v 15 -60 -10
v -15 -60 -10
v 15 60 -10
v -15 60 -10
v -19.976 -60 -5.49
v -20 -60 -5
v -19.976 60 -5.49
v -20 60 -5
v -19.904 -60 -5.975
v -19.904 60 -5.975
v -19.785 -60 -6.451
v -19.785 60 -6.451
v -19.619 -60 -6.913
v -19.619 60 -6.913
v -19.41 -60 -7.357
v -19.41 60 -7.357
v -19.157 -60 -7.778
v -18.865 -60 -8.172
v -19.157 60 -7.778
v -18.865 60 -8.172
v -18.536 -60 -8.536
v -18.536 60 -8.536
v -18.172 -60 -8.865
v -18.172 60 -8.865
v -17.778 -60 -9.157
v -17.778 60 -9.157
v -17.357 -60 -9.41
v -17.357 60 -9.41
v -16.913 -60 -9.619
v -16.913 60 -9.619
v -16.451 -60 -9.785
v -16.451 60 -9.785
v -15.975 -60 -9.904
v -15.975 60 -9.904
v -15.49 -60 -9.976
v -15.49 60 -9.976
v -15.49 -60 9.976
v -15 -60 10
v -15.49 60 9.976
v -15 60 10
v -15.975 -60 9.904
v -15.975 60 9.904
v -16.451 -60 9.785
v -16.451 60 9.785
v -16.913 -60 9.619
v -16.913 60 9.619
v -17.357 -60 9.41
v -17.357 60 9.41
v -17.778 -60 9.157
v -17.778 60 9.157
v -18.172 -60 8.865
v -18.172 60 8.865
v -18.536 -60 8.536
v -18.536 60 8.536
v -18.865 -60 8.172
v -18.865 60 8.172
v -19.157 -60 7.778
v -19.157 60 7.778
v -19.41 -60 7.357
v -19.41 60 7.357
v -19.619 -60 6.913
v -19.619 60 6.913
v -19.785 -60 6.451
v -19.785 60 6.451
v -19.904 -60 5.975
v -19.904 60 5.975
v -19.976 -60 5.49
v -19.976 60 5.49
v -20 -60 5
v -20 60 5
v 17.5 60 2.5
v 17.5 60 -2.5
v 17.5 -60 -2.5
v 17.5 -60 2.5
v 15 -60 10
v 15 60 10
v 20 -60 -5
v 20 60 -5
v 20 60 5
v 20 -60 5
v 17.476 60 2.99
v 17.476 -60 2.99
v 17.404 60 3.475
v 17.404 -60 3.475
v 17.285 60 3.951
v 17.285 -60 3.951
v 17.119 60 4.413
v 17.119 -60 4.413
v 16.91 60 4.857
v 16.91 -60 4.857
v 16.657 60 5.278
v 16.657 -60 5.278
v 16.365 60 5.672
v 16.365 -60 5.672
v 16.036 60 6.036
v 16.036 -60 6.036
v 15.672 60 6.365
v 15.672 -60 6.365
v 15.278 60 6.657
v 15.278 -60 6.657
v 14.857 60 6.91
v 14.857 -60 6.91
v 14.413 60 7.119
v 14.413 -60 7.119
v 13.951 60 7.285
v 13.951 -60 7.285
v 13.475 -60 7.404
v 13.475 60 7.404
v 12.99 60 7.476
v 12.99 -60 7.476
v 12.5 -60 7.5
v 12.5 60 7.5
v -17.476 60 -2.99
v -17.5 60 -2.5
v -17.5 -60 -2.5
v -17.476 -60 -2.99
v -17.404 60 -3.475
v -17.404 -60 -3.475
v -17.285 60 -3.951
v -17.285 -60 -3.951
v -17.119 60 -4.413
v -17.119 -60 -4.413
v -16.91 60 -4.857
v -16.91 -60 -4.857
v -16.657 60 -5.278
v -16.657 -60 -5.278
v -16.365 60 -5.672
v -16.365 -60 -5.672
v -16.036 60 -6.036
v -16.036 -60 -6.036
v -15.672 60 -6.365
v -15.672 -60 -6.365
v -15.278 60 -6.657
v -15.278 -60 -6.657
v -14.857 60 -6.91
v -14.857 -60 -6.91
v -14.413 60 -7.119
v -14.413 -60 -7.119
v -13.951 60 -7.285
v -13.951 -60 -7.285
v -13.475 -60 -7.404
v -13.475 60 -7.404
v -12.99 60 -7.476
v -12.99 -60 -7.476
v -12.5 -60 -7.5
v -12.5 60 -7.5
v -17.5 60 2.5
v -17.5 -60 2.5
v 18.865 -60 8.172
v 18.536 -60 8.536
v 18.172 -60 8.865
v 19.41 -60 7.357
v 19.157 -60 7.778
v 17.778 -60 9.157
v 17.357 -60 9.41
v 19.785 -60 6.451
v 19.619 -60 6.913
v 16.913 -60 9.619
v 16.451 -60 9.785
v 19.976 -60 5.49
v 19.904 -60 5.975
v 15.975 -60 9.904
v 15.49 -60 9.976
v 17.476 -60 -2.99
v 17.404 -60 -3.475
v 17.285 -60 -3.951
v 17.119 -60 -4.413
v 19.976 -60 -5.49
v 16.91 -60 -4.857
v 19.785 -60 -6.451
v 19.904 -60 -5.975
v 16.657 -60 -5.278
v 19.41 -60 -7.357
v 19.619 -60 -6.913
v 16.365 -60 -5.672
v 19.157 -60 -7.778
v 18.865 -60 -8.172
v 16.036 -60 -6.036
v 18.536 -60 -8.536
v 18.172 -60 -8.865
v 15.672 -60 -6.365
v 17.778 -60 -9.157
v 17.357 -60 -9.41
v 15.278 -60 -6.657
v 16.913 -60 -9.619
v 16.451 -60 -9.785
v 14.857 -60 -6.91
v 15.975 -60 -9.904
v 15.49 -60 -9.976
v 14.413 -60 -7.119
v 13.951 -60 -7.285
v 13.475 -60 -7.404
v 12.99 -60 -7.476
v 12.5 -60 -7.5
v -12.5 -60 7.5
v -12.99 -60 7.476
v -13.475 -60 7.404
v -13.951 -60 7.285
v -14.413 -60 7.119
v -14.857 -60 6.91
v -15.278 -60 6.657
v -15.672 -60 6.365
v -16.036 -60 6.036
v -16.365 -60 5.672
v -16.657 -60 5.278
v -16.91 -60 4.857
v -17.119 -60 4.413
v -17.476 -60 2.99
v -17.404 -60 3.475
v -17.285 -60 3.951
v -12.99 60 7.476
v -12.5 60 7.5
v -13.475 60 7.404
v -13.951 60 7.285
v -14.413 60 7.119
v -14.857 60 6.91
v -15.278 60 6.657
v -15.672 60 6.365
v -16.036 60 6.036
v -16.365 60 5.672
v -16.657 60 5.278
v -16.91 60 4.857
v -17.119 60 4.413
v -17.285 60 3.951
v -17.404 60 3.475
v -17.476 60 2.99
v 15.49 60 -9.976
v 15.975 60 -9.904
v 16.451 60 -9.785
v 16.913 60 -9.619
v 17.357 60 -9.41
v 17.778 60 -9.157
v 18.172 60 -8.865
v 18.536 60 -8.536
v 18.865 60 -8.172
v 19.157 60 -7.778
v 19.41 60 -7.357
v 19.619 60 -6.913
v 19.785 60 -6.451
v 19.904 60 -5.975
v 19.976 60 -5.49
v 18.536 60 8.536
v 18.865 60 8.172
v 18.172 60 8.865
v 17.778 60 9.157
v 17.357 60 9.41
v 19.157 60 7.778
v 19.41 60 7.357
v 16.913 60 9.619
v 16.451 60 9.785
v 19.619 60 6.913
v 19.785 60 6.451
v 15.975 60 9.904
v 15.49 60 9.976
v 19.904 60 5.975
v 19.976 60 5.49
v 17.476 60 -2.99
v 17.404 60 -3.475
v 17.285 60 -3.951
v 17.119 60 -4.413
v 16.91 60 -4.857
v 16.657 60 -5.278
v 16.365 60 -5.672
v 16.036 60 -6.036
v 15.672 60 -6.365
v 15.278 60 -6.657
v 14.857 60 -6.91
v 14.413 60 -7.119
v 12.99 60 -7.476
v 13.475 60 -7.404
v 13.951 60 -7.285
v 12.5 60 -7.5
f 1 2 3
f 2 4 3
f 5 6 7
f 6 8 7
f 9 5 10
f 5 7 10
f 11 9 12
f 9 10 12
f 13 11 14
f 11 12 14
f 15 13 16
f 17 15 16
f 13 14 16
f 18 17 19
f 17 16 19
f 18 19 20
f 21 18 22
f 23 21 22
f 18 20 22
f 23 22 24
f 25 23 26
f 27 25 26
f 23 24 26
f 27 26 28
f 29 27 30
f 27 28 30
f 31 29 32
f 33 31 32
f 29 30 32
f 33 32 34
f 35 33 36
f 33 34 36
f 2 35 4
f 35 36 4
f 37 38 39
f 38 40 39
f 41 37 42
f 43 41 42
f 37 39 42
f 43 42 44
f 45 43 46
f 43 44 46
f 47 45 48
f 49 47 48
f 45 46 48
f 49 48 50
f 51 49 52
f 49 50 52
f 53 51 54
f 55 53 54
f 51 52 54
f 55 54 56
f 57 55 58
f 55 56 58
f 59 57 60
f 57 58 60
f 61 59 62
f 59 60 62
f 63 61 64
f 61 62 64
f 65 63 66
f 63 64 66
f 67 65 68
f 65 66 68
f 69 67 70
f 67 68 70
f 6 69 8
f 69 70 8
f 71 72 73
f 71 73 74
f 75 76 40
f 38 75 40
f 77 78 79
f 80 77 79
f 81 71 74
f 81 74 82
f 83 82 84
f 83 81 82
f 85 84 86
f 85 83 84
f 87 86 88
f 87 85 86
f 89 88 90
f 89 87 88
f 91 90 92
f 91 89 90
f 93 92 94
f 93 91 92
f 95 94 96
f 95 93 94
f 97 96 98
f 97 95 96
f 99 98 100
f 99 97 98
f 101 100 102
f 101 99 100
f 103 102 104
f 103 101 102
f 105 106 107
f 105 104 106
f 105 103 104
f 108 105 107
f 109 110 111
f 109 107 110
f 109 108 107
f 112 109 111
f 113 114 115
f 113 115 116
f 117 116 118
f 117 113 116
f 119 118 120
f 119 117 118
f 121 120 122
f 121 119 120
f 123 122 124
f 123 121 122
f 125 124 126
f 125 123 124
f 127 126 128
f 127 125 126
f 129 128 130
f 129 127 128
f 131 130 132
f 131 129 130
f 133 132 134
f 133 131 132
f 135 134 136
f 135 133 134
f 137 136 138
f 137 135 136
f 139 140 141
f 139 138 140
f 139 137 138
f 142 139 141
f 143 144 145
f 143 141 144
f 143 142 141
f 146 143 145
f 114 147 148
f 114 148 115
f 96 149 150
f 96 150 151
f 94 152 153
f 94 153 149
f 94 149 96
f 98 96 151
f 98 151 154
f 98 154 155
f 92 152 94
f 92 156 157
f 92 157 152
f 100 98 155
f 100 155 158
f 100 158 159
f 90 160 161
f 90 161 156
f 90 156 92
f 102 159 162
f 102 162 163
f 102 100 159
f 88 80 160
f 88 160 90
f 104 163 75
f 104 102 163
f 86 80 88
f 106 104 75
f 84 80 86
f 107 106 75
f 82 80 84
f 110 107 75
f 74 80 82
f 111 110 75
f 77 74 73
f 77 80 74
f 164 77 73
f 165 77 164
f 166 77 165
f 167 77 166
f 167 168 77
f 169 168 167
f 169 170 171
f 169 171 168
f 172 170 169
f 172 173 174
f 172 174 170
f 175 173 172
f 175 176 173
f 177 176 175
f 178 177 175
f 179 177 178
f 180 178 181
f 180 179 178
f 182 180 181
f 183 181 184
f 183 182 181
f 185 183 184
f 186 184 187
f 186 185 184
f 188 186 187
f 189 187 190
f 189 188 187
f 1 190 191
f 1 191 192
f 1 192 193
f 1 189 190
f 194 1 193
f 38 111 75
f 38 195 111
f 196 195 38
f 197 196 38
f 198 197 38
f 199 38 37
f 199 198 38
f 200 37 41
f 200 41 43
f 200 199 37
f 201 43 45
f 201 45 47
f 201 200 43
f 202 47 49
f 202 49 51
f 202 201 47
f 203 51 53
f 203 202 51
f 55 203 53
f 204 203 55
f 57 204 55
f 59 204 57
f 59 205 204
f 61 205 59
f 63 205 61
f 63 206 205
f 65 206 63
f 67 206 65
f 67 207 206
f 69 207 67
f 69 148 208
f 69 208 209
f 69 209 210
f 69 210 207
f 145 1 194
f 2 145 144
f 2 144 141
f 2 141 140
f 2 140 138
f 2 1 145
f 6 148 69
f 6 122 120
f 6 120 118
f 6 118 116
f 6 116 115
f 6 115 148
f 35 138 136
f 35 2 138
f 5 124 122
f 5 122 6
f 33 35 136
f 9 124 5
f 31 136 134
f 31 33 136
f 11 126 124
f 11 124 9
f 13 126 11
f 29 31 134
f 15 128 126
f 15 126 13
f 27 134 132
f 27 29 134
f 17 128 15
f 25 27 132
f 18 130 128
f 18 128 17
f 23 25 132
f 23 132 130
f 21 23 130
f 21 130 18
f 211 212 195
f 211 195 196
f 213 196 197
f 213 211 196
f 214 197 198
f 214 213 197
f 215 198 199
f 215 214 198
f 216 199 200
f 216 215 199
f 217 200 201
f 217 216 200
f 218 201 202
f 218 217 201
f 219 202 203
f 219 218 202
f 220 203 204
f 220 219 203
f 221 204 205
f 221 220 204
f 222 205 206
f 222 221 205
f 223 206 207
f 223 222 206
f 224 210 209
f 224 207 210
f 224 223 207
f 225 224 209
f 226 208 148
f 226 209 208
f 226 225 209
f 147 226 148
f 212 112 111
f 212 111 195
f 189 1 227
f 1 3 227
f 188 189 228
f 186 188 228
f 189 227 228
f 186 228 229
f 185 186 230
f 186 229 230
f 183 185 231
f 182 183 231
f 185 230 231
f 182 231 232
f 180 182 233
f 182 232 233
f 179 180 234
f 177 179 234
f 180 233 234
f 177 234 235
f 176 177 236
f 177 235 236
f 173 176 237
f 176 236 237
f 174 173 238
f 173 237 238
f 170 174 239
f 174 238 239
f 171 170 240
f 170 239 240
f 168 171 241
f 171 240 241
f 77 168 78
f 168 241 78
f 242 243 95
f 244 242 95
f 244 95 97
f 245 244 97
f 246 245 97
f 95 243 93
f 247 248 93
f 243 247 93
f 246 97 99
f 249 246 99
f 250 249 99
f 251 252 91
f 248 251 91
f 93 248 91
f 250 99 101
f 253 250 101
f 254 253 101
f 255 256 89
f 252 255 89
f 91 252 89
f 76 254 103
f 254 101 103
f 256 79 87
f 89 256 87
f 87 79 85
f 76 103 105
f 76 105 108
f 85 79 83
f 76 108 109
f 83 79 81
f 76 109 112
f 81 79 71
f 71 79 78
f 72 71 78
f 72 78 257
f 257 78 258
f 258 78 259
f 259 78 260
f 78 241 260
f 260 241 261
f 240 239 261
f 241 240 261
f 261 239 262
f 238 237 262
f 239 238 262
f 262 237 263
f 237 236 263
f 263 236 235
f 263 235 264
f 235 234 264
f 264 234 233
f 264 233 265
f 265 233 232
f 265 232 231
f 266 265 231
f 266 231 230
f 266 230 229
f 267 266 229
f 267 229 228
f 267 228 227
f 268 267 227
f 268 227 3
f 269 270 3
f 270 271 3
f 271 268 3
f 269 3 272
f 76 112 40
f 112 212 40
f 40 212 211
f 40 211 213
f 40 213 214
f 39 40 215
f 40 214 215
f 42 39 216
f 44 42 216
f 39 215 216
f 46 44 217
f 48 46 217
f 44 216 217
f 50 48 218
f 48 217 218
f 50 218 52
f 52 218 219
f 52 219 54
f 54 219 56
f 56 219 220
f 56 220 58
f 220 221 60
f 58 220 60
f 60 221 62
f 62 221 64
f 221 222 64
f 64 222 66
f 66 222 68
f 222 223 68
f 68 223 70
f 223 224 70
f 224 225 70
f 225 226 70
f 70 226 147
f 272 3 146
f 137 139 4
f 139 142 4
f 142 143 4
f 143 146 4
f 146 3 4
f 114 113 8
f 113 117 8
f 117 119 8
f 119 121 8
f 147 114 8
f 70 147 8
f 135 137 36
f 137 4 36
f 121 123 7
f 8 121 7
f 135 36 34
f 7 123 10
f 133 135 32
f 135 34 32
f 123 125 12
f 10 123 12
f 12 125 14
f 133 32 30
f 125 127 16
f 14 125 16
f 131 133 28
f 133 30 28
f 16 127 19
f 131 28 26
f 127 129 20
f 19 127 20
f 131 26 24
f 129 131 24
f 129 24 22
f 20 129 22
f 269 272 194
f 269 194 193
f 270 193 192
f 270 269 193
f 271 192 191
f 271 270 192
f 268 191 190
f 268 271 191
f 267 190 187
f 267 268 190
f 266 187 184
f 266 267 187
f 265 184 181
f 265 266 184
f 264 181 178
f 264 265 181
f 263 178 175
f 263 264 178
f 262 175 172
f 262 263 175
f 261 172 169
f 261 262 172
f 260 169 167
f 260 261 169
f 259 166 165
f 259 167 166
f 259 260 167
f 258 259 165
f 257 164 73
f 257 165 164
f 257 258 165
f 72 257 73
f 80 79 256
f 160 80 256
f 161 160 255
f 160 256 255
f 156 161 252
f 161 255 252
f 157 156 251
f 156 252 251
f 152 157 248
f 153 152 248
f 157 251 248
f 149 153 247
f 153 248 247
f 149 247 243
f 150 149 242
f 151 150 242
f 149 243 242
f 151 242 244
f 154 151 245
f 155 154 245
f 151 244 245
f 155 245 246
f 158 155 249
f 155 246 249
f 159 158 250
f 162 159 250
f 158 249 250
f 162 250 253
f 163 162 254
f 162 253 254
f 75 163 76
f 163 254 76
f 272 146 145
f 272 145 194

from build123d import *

# Parameters (mm, degrees)
BOSS_EXTRUDE2_DEPTH = 60
CUT_EXTRUDE2_DEPTH  = 123.065556157


with BuildPart() as part:
    # Sketch1 → Boss-Extrude2 (new, symmetric)
    with BuildSketch(Plane(origin=(0, 0, 0), x_dir=(1, 0, 0), z_dir=(0, 1, 0))):
        with BuildLine():
            Line((15, -10), (-15, -10))
            ThreePointArc((-15, -10), (-18.535533906, -8.535533906), (-20, -5))
            Line((-20, -5), (-20, 5))
            ThreePointArc((-20, 5), (-18.535533906, 8.535533906), (-15, 10))
            Line((-15, 10), (15, 10))
            ThreePointArc((15, 10), (18.535533906, 8.535533906), (20, 5))
            Line((20, 5), (20, -5))
            ThreePointArc((20, -5), (18.535533906, -8.535533906), (15, -10))
        make_face()
    extrude(amount=BOSS_EXTRUDE2_DEPTH, both=True)

    # Sketch3 → Cut-Extrude2 (cut, through all)
    with BuildSketch(Plane(origin=(0, 60, 0), x_dir=(1, 0, 0), z_dir=(0, 1, 0))):
        with BuildLine():
            Line((12.5, -7.5), (-12.5, -7.5))
            ThreePointArc((-12.5, -7.5), (-16.035533906, -6.035533906), (-17.5, -2.5))
            Line((-17.5, -2.5), (-17.5, 2.5))
            ThreePointArc((-17.5, 2.5), (-16.035533906, 6.035533906), (-12.5, 7.5))
            Line((-12.5, 7.5), (12.5, 7.5))
            ThreePointArc((12.5, 7.5), (16.035533906, 6.035533906), (17.5, 2.5))
            Line((17.5, 2.5), (17.5, -2.5))
            ThreePointArc((17.5, -2.5), (16.035533906, -6.035533906), (12.5, -7.5))
        make_face()
    extrude(amount=-CUT_EXTRUDE2_DEPTH, mode=Mode.SUBTRACT)


solid = part.part
